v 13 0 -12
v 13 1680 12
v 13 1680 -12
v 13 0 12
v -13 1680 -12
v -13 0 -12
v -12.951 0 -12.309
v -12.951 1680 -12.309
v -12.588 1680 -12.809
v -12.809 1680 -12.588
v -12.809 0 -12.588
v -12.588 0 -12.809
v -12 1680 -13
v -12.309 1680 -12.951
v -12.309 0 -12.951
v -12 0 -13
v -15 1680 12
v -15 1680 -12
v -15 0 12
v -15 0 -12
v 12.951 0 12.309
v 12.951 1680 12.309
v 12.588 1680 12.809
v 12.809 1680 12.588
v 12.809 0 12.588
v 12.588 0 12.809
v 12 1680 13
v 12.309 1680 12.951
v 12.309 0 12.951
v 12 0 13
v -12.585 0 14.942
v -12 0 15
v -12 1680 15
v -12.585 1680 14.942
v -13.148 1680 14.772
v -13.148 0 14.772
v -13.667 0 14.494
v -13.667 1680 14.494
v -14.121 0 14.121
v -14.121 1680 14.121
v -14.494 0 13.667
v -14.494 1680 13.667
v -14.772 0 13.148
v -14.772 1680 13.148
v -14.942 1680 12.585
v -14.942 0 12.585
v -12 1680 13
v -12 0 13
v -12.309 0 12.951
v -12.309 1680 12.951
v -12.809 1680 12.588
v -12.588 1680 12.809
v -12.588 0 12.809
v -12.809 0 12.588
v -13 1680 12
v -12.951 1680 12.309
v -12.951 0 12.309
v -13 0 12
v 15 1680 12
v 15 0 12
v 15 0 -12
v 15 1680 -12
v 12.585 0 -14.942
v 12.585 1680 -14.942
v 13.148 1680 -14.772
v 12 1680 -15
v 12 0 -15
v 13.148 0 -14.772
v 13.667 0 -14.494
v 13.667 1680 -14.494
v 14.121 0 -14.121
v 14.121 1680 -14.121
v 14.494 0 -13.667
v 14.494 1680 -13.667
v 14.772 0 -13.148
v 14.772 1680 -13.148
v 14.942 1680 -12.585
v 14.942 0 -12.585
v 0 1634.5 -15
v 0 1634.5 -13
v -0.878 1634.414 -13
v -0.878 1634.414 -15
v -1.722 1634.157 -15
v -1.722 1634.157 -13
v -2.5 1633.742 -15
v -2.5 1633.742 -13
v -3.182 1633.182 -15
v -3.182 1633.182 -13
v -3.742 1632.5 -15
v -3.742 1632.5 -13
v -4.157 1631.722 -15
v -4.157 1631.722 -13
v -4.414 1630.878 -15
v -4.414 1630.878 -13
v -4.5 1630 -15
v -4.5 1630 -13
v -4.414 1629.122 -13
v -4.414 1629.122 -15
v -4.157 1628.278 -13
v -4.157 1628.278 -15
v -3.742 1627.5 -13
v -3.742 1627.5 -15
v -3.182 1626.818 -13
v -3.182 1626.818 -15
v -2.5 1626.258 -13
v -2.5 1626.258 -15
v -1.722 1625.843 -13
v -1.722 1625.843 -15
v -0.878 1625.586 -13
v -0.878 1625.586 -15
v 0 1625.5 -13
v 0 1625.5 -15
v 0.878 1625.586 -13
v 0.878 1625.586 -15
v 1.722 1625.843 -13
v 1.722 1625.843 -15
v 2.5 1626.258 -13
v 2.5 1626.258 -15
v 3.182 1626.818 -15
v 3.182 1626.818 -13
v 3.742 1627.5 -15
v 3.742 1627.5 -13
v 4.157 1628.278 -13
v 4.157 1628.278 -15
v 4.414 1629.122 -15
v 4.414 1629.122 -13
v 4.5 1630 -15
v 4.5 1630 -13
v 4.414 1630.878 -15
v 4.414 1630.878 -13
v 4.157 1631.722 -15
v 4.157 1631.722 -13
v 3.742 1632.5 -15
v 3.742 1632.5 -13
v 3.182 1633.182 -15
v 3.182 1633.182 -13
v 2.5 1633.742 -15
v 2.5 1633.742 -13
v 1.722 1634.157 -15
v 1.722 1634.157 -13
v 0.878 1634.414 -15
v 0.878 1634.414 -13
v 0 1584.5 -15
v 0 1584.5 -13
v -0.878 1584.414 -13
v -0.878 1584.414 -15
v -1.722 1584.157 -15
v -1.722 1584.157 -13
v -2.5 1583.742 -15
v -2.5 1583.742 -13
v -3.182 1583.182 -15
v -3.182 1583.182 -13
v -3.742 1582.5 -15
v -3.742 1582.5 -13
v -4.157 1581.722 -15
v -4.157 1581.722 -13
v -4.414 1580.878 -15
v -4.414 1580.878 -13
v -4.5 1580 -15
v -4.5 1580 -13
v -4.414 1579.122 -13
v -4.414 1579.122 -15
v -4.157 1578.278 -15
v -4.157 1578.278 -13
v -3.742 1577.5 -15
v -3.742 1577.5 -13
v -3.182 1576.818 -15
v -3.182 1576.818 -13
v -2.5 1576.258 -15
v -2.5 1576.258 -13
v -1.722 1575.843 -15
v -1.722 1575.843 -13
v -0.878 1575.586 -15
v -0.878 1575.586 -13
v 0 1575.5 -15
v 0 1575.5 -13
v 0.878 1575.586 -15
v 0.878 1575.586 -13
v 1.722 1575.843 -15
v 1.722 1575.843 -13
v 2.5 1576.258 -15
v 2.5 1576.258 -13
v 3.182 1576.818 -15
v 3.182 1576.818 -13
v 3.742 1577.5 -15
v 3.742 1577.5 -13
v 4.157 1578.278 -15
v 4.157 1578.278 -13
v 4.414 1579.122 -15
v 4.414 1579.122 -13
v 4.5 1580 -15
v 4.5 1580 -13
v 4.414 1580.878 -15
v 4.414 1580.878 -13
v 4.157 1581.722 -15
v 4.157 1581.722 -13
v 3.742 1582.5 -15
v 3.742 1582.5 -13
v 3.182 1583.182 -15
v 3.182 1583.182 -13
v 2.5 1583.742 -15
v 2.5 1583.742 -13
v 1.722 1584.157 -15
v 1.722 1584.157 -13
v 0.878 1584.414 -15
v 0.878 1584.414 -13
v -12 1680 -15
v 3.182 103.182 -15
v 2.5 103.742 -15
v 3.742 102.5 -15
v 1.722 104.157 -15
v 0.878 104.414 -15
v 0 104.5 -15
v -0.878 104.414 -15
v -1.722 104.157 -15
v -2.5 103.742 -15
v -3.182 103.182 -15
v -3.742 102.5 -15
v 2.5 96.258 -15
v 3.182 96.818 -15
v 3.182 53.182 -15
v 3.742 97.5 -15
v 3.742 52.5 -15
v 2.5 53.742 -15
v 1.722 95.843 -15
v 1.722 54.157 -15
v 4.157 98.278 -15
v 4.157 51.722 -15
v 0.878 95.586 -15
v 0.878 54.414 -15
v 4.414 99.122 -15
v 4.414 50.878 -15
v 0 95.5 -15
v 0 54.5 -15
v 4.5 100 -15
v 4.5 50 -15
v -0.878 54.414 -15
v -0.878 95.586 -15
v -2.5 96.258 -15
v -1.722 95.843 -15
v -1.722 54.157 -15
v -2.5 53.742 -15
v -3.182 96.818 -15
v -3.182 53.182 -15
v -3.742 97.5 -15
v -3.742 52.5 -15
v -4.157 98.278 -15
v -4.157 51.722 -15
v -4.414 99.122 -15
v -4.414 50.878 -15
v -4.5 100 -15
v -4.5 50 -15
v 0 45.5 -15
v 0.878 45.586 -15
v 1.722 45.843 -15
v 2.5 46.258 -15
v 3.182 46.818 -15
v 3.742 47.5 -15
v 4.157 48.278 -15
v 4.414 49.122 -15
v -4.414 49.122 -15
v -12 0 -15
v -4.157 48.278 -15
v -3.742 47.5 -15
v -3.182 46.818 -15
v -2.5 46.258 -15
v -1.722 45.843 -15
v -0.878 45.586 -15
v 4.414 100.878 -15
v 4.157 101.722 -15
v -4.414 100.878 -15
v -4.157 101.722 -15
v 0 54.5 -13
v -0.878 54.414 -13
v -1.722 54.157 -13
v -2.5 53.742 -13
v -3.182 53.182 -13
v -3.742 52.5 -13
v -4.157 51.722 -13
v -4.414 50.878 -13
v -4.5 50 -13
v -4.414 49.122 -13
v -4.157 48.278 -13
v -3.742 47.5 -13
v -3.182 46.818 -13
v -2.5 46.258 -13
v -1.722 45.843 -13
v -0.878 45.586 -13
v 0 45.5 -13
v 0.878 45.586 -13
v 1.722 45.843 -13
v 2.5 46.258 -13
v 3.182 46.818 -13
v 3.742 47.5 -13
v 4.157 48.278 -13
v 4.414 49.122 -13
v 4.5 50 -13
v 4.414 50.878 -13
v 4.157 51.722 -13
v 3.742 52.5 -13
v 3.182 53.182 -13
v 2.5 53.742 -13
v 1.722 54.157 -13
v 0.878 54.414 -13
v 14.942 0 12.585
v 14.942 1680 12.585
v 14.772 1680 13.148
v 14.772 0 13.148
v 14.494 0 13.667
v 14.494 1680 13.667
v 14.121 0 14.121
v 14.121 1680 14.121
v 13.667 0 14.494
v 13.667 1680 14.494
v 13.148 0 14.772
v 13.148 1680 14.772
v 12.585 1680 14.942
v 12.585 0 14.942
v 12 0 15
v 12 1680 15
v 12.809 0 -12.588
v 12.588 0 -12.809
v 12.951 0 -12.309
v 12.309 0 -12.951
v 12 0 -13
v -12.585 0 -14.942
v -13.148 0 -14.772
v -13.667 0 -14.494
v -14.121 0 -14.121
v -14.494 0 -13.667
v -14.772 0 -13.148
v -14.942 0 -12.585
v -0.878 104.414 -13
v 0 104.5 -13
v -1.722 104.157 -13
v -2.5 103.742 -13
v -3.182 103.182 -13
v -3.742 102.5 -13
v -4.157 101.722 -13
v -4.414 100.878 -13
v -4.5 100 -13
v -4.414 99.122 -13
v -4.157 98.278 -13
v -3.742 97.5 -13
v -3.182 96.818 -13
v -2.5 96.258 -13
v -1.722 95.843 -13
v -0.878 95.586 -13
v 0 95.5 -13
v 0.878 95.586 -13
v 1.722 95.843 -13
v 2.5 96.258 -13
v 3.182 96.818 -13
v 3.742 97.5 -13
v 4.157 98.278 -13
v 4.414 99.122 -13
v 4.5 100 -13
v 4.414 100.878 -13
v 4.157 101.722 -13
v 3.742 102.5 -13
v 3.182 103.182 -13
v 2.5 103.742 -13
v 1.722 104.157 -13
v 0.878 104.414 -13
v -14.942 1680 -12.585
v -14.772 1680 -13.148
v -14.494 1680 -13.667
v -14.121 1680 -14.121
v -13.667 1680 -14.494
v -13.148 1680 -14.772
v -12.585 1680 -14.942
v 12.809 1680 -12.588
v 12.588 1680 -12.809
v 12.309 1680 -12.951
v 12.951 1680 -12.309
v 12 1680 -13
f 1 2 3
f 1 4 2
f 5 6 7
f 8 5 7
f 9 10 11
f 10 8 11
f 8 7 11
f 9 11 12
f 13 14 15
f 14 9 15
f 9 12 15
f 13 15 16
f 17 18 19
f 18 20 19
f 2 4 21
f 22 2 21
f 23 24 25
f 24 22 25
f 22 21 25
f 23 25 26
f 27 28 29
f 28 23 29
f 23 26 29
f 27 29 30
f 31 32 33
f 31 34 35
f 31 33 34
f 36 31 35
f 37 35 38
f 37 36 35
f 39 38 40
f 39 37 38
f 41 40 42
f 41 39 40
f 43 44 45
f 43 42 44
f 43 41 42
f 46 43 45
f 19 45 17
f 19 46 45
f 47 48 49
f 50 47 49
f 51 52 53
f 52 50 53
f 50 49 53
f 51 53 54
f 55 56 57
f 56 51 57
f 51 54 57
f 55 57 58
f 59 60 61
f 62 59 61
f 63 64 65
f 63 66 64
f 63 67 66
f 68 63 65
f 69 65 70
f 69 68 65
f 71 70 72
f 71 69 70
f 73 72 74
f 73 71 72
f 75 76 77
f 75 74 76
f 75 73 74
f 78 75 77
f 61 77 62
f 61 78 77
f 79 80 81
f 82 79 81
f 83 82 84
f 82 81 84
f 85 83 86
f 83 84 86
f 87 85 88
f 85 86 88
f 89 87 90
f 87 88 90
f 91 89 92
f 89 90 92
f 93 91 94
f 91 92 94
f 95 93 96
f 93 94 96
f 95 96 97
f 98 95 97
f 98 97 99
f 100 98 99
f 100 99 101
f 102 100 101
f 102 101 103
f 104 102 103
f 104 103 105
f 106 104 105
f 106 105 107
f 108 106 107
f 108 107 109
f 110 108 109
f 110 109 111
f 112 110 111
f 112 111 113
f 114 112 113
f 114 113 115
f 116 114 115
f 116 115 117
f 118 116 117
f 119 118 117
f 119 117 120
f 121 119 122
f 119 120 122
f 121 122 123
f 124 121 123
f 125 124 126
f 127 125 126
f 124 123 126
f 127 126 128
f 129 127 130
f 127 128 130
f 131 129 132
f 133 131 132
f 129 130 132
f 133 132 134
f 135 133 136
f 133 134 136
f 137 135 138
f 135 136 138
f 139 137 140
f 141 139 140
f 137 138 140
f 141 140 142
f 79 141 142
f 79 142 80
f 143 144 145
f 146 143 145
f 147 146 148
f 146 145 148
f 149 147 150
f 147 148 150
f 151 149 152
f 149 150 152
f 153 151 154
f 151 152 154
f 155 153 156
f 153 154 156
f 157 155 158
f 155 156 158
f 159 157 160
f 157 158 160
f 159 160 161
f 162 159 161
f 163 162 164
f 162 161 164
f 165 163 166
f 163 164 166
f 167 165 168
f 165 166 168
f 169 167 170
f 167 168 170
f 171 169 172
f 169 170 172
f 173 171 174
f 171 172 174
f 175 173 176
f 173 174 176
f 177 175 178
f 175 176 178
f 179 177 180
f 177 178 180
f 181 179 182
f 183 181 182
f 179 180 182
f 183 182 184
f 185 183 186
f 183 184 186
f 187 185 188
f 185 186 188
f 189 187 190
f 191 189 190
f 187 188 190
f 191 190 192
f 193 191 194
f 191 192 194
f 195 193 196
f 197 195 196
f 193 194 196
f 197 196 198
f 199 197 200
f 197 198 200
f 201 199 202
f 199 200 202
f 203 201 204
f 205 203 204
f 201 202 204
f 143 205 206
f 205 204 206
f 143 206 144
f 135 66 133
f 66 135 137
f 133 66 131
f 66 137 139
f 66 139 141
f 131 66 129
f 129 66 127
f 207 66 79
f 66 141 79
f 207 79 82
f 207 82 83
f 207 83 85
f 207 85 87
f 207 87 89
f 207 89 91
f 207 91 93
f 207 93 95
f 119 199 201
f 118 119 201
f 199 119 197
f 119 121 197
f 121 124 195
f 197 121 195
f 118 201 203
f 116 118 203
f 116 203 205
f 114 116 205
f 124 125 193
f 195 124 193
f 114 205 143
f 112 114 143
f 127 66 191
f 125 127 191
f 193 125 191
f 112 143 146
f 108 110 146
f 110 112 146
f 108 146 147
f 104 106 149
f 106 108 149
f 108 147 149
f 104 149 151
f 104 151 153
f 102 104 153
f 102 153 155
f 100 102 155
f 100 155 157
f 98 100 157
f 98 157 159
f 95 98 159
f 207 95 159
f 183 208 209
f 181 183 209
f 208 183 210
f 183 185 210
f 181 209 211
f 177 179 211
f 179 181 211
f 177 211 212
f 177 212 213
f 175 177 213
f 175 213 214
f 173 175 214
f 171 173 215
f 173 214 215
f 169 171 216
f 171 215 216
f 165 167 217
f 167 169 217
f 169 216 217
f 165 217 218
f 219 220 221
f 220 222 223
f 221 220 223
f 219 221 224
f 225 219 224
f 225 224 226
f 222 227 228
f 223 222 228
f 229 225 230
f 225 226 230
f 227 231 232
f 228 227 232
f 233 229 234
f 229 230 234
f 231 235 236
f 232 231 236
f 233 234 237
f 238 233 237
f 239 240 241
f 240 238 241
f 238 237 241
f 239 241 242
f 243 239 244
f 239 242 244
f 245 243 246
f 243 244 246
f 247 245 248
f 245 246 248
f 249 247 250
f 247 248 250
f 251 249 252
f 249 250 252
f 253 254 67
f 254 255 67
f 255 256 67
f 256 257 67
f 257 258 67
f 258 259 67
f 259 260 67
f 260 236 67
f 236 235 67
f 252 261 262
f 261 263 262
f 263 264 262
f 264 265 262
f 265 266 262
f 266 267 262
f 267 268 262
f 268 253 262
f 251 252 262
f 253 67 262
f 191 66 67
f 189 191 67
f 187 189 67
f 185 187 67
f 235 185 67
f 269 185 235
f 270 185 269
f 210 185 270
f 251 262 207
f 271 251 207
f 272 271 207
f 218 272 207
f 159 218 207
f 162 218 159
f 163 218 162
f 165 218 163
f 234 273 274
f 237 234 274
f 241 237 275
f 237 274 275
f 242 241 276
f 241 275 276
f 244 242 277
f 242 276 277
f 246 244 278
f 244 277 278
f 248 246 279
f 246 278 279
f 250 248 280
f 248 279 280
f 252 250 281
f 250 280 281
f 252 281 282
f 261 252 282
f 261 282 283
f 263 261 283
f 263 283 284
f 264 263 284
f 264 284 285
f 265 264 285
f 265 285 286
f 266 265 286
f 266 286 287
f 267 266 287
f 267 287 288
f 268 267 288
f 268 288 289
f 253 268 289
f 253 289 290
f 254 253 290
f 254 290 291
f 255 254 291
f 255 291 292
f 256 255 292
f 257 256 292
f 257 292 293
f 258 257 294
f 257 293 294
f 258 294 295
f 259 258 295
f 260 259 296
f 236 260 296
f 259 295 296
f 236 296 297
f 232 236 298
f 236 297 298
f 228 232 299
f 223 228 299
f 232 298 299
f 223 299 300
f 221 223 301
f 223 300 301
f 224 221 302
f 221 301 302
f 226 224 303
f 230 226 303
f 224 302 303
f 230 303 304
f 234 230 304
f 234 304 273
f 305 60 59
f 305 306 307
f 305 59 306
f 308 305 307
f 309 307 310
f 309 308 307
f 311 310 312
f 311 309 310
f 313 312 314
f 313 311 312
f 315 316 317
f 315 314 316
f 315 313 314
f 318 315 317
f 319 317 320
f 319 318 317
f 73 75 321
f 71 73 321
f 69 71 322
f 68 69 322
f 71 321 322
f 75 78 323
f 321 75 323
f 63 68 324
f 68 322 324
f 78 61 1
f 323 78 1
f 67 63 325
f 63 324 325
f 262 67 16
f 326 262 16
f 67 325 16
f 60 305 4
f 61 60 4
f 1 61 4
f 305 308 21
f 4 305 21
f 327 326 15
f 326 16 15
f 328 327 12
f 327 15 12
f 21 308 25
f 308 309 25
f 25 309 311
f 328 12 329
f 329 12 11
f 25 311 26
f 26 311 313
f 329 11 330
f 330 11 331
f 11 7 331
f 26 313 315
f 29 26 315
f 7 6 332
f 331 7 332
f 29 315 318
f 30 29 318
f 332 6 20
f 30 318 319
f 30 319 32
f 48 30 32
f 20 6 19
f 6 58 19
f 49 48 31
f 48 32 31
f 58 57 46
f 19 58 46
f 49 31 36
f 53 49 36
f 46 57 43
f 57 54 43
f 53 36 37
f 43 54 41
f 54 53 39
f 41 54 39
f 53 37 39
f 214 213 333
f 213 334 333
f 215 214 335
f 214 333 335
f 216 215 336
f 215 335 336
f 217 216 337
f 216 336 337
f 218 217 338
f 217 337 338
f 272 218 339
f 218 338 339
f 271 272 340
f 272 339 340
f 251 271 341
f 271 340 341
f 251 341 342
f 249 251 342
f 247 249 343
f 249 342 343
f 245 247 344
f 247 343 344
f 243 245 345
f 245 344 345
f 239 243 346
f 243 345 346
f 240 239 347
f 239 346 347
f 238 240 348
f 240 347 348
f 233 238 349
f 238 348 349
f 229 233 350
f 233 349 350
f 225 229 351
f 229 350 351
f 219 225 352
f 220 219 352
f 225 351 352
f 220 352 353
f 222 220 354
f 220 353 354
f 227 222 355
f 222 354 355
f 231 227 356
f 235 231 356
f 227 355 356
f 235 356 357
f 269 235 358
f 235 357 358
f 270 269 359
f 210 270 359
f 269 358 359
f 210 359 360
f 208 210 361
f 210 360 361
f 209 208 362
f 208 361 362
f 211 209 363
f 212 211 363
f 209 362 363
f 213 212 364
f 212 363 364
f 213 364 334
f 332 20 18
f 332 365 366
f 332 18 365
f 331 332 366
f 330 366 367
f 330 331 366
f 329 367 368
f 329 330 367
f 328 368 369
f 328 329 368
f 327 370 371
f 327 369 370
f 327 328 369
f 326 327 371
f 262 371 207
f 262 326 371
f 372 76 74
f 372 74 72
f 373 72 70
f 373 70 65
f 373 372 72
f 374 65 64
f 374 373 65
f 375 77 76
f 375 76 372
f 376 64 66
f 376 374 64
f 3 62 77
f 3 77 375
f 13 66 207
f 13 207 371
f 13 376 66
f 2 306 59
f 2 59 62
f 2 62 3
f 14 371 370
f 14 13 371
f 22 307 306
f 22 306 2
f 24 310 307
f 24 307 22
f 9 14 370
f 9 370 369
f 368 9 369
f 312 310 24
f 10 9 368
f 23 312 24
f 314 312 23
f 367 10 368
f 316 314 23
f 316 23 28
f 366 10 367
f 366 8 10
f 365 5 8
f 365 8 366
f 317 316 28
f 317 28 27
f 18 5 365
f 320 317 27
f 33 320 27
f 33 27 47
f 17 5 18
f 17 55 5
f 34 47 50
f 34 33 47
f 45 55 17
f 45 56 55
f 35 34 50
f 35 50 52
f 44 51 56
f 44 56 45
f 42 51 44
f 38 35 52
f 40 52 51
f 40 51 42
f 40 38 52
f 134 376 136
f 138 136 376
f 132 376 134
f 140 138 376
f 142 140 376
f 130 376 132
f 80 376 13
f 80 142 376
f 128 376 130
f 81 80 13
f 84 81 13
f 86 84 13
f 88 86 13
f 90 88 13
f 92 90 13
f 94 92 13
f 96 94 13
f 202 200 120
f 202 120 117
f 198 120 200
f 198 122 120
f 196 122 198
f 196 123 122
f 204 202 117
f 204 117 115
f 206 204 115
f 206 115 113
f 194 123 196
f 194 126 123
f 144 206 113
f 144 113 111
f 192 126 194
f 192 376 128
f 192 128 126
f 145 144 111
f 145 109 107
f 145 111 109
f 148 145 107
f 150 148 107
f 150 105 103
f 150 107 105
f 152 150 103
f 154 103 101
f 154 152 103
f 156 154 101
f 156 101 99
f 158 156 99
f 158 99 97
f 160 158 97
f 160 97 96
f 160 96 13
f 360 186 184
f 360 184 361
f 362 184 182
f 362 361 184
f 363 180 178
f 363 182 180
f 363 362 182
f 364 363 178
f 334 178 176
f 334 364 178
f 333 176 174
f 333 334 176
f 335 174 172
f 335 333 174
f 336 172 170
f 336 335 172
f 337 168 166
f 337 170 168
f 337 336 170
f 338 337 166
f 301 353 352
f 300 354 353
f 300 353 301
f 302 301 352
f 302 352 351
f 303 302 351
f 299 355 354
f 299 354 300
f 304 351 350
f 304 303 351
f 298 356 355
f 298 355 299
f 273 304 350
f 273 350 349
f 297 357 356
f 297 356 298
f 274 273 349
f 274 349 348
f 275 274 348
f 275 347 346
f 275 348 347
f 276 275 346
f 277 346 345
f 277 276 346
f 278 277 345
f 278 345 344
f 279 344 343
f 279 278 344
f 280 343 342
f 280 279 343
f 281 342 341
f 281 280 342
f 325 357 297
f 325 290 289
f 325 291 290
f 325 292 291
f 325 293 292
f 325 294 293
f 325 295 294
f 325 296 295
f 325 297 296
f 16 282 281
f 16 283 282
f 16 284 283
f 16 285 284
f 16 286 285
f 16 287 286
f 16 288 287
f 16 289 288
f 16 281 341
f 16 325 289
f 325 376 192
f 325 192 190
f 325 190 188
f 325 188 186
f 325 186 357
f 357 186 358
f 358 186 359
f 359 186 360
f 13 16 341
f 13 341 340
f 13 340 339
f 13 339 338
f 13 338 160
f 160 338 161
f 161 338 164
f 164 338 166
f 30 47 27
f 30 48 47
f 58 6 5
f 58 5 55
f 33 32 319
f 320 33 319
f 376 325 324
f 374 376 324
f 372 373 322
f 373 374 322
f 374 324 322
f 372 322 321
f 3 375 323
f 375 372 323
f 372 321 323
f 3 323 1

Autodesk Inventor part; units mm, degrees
ref_plane "XZ Plane" through (0, 0, 0) normal (0, 1, 0) x (-1, 0, 0)
sketch "Sketch1" plane through (0, 0, 0) normal (0, 1, 0) x (-1, 0, 0)
  line L0 (-12, 14) -> (12, 14) construction
  line L1 (14, 12) -> (14, -12) construction
  line L2 (12, -14) -> (-12, -14) construction
  line L3 (-14, -12) -> (-14, 12) construction
  line L4 (-14, 14) -> (14, -14) construction
  line L5 (14, 14) -> (-14, -14) construction
  arc A0 (14, 12) -> (12, 14) centre (12, 12) ccw construction
  arc A1 (12, -14) -> (14, -12) centre (12, -12) ccw construction
  arc A2 (-14, -12) -> (-12, -14) centre (-12, -12) ccw construction
  arc A3 (-12, 14) -> (-14, 12) centre (-12, 12) ccw construction
  line L6 (-12, -15) -> (12, -15)
  arc A4 (12, -15) -> (15, -12) centre (12, -12) ccw
  line L7 (15, -12) -> (15, 12)
  arc A5 (15, 12) -> (12, 15) centre (12, 12) ccw
  line L8 (12, 15) -> (-12, 15)
  arc A6 (-12, 15) -> (-15, 12) centre (-12, 12) ccw
  line L9 (-15, 12) -> (-15, -12)
  arc A7 (-15, -12) -> (-12, -15) centre (-12, -12) ccw
  line L10 (13, -12) -> (13, 12)
  arc A8 (13, 12) -> (12, 13) centre (12, 12) ccw
  line L11 (12, 13) -> (-12, 13)
  arc A9 (-12, 13) -> (-13, 12) centre (-12, 12) ccw
  line L12 (-13, 12) -> (-13, -12)
  arc A10 (-13, -12) -> (-12, -13) centre (-12, -12) ccw
  line L13 (-12, -13) -> (12, -13)
  arc A11 (12, -13) -> (13, -12) centre (12, -12) ccw
  point P0 (0, 0)
  point P1 (0, 0)
  point P2 (0, 0)
  dimension "d10" = 2
  dimension "depth" = 30
  dimension "width" = 30
  dimension "thickness" = 2
extrude "Extrusion1" add sketch "Sketch1" along normal blind 1680
sketch "Sketch2" plane through (12, 0, -15) normal (0, 0, -1) x (-1, 0, 0)
  line L0 (12, -336) -> (12, 2016) construction
  line L1 (0, 0) -> (24, 0) projected
  line L2 (0, 1680) -> (24, 1680) projected
  point P0 (12, 0)
  point P1 (12, 50)
  point P2 (12, 100)
  point P3 (12, 1630)
  point P4 (12, 1580)
  dimension "d16" = 50
  dimension "d17" = 50
  dimension "d18" = 50
  dimension "d20" = 50
hole "Hole1" at (0, 50, -15) at (0, 100, -15) at (0, 1630, -15) at (0, 1580, -15) direction (0, 0, 1) diameter 9 depth 20.2 tip angle 118
equation "\"d10\" = thickness"
properties part number "Przedluzka L1680" material "Steel"
